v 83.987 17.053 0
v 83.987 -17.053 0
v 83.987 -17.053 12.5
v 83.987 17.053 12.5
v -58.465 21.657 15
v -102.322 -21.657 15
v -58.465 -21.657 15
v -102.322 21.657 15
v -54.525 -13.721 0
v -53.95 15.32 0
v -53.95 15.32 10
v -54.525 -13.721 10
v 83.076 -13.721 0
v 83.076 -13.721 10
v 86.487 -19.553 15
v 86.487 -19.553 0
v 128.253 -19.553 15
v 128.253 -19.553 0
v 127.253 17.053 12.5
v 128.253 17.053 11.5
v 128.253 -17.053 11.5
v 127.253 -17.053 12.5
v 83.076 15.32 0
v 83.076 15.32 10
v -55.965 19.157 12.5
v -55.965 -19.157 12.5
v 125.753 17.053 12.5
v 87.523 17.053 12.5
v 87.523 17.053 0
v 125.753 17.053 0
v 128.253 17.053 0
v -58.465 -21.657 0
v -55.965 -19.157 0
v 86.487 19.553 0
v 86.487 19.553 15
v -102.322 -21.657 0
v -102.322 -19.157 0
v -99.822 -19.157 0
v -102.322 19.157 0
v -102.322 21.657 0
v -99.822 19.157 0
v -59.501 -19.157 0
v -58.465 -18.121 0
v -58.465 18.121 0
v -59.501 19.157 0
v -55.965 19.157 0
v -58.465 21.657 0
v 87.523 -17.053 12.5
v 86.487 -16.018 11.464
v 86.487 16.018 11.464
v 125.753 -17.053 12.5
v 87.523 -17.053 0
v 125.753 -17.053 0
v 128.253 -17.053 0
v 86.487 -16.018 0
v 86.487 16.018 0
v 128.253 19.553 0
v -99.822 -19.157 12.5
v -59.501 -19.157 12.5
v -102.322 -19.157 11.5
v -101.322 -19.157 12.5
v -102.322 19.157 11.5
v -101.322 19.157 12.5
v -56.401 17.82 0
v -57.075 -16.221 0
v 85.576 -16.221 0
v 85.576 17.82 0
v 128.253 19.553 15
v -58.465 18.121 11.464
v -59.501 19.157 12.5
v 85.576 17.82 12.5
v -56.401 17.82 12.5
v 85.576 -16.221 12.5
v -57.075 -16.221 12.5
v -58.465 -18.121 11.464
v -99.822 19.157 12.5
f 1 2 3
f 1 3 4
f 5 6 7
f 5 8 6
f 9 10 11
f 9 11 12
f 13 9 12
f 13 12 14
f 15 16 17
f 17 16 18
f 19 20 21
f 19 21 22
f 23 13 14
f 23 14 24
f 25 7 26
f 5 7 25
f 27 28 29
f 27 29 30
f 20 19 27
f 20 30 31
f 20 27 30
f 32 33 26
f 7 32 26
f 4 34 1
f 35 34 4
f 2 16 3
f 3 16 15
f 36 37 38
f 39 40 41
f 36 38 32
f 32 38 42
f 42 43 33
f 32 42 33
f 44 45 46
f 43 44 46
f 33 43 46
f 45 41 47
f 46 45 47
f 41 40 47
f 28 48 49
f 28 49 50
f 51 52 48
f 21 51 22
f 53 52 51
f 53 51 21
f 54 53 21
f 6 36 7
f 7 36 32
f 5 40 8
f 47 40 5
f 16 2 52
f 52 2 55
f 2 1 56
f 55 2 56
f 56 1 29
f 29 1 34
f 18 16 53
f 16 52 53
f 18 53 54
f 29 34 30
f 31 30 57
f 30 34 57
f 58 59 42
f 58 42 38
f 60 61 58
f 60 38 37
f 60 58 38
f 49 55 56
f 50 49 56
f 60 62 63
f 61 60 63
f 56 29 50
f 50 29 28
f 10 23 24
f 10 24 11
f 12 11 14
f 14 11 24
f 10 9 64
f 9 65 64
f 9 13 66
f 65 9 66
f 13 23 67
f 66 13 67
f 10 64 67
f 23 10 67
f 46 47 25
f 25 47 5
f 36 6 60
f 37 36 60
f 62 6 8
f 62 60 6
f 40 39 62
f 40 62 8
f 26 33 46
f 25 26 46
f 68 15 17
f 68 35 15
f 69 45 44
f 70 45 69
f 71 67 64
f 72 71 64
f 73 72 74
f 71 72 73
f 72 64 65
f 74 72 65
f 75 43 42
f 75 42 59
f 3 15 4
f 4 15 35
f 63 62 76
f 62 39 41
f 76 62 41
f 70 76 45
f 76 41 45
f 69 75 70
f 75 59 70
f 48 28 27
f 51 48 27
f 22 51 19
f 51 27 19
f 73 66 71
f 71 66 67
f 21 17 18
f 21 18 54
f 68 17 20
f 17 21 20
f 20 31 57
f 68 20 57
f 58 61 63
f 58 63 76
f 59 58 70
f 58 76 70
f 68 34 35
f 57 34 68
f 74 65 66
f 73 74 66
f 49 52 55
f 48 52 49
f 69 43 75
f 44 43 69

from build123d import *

# Parameters (mm, degrees)
F9_W         = 46.3566482067
F9_H         = 43.3133840561
F10_DEPTH    = 15
F0_W         = 44.2660450935
F0_H         = 39.1066074371
F1_SIZE      = 2.5
F2_SIZE      = 2.5
F3_DEPTH     = 12.5
F4_T         = -2.5
F4_2_T       = -2.5
F4_3_T       = -2.5
F8_T4_DEPTH  = 34.1066074371
F13_T4_DEPTH = 38.3133840561


# Not quite as in the source:
# - a fillet or chamfer that OpenCascade refuses, or shapes differently, is made with other operations: its cross-section is extruded or revolved along the edge and cut away or added
# - the program builds the solid bodies; features that only make, move or delete a surface that nothing else refers to are left out


with BuildPart() as f10:
    # F9 (on Top) → F10 (new body)
    with BuildSketch(Plane.XY):
        with Locations((-79.1433677077, 0)):
            Rectangle(F9_W, F9_H)
    extrude(amount=F10_DEPTH)

    # F2
    f2_edges = [f10.edges().sort_by_distance(p)[0] for p in [
        (-55.965044, -21.656692, 7.5),
        (-55.965044, 0, 15),
        (-55.965044, 21.656692, 7.5),
    ]]
    chamfer(f2_edges, length=F2_SIZE)

    # F4#2
    f4_2_openings = [f10.faces().sort_by_distance(p)[0] for p in [
        (-79.21314, 0, 0),
    ]]
    offset(amount=F4_2_T, openings=f4_2_openings)

    # F13: chamfer of 14 on 1 edges, made by hand


with BuildPart() as f10b:
    # F0 (on Top) → F10, piece 2 (new body)
    with BuildSketch(Plane.XY):
        with Locations((106.1204075813, 0)):
            Rectangle(F0_W, F0_H)
    extrude(amount=F10_DEPTH)

    # F1
    f1_edges = [f10b.edges().sort_by_distance(p)[0] for p in [
        (83.987385, 19.553304, 7.5),
        (83.987385, -19.553304, 7.5),
        (83.987385, 0, 15),
    ]]
    chamfer(f1_edges, length=F1_SIZE)

    # F4#3
    f4_3_openings = [f10b.faces().sort_by_distance(p)[0] for p in [
        (106.197587, 0, 0),
    ]]
    offset(amount=F4_3_T, openings=f4_3_openings)

    # F8: chamfer of 14 on 1 edges, made by hand


with BuildPart() as f3:
    # F11 (on Top) → F3 (new body)
    with BuildSketch(Plane.XY):
        Polygon((85.5761021376, 17.819724977), (-56.4013458788, 17.819724977), (-57.0746399462, -16.2213742733), (85.5761021376, -16.2213742733), align=None)
    extrude(amount=F3_DEPTH)

    # F4
    f4_openings = [f3.faces().sort_by_distance(p)[0] for p in [
        (14.418922, 0.785755, 0),
    ]]
    offset(amount=F4_T, openings=f4_openings)


with BuildPart() as f8_tool2:
    # F8_s3 → F8_t4 (new body)
    with BuildSketch(Plane.XZ.offset(17.0533037186)):
        Polygon((139.7534301281, 0), (125.7534301281, 14), (125.7534301281, 0), align=None)
    extrude(amount=-F8_T4_DEPTH)

    split(bisect_by=Plane.XY.offset(12.5), keep=Keep.BOTTOM)


with BuildPart() as f10b_1:
    add(f10b.part)

    # F8_t1: cut F8_tool2
    add(f8_tool2.part, mode=Mode.SUBTRACT)


with BuildPart() as f13_tool2:
    # F13_s3 → F13_t4 (new body)
    with BuildSketch(Plane.XZ.offset(-19.156692028)):
        Polygon((-113.8216918111, 0), (-99.8216918111, 14), (-99.8216918111, 0), align=None)
    extrude(amount=F13_T4_DEPTH)

    split(bisect_by=Plane.XY.offset(12.5), keep=Keep.BOTTOM)


with BuildPart() as f10_1:
    add(f10.part)

    # F13_t1: cut F13_tool2
    add(f13_tool2.part, mode=Mode.SUBTRACT)


solid = Compound([f3.part, f10b_1.part, f10_1.part])
